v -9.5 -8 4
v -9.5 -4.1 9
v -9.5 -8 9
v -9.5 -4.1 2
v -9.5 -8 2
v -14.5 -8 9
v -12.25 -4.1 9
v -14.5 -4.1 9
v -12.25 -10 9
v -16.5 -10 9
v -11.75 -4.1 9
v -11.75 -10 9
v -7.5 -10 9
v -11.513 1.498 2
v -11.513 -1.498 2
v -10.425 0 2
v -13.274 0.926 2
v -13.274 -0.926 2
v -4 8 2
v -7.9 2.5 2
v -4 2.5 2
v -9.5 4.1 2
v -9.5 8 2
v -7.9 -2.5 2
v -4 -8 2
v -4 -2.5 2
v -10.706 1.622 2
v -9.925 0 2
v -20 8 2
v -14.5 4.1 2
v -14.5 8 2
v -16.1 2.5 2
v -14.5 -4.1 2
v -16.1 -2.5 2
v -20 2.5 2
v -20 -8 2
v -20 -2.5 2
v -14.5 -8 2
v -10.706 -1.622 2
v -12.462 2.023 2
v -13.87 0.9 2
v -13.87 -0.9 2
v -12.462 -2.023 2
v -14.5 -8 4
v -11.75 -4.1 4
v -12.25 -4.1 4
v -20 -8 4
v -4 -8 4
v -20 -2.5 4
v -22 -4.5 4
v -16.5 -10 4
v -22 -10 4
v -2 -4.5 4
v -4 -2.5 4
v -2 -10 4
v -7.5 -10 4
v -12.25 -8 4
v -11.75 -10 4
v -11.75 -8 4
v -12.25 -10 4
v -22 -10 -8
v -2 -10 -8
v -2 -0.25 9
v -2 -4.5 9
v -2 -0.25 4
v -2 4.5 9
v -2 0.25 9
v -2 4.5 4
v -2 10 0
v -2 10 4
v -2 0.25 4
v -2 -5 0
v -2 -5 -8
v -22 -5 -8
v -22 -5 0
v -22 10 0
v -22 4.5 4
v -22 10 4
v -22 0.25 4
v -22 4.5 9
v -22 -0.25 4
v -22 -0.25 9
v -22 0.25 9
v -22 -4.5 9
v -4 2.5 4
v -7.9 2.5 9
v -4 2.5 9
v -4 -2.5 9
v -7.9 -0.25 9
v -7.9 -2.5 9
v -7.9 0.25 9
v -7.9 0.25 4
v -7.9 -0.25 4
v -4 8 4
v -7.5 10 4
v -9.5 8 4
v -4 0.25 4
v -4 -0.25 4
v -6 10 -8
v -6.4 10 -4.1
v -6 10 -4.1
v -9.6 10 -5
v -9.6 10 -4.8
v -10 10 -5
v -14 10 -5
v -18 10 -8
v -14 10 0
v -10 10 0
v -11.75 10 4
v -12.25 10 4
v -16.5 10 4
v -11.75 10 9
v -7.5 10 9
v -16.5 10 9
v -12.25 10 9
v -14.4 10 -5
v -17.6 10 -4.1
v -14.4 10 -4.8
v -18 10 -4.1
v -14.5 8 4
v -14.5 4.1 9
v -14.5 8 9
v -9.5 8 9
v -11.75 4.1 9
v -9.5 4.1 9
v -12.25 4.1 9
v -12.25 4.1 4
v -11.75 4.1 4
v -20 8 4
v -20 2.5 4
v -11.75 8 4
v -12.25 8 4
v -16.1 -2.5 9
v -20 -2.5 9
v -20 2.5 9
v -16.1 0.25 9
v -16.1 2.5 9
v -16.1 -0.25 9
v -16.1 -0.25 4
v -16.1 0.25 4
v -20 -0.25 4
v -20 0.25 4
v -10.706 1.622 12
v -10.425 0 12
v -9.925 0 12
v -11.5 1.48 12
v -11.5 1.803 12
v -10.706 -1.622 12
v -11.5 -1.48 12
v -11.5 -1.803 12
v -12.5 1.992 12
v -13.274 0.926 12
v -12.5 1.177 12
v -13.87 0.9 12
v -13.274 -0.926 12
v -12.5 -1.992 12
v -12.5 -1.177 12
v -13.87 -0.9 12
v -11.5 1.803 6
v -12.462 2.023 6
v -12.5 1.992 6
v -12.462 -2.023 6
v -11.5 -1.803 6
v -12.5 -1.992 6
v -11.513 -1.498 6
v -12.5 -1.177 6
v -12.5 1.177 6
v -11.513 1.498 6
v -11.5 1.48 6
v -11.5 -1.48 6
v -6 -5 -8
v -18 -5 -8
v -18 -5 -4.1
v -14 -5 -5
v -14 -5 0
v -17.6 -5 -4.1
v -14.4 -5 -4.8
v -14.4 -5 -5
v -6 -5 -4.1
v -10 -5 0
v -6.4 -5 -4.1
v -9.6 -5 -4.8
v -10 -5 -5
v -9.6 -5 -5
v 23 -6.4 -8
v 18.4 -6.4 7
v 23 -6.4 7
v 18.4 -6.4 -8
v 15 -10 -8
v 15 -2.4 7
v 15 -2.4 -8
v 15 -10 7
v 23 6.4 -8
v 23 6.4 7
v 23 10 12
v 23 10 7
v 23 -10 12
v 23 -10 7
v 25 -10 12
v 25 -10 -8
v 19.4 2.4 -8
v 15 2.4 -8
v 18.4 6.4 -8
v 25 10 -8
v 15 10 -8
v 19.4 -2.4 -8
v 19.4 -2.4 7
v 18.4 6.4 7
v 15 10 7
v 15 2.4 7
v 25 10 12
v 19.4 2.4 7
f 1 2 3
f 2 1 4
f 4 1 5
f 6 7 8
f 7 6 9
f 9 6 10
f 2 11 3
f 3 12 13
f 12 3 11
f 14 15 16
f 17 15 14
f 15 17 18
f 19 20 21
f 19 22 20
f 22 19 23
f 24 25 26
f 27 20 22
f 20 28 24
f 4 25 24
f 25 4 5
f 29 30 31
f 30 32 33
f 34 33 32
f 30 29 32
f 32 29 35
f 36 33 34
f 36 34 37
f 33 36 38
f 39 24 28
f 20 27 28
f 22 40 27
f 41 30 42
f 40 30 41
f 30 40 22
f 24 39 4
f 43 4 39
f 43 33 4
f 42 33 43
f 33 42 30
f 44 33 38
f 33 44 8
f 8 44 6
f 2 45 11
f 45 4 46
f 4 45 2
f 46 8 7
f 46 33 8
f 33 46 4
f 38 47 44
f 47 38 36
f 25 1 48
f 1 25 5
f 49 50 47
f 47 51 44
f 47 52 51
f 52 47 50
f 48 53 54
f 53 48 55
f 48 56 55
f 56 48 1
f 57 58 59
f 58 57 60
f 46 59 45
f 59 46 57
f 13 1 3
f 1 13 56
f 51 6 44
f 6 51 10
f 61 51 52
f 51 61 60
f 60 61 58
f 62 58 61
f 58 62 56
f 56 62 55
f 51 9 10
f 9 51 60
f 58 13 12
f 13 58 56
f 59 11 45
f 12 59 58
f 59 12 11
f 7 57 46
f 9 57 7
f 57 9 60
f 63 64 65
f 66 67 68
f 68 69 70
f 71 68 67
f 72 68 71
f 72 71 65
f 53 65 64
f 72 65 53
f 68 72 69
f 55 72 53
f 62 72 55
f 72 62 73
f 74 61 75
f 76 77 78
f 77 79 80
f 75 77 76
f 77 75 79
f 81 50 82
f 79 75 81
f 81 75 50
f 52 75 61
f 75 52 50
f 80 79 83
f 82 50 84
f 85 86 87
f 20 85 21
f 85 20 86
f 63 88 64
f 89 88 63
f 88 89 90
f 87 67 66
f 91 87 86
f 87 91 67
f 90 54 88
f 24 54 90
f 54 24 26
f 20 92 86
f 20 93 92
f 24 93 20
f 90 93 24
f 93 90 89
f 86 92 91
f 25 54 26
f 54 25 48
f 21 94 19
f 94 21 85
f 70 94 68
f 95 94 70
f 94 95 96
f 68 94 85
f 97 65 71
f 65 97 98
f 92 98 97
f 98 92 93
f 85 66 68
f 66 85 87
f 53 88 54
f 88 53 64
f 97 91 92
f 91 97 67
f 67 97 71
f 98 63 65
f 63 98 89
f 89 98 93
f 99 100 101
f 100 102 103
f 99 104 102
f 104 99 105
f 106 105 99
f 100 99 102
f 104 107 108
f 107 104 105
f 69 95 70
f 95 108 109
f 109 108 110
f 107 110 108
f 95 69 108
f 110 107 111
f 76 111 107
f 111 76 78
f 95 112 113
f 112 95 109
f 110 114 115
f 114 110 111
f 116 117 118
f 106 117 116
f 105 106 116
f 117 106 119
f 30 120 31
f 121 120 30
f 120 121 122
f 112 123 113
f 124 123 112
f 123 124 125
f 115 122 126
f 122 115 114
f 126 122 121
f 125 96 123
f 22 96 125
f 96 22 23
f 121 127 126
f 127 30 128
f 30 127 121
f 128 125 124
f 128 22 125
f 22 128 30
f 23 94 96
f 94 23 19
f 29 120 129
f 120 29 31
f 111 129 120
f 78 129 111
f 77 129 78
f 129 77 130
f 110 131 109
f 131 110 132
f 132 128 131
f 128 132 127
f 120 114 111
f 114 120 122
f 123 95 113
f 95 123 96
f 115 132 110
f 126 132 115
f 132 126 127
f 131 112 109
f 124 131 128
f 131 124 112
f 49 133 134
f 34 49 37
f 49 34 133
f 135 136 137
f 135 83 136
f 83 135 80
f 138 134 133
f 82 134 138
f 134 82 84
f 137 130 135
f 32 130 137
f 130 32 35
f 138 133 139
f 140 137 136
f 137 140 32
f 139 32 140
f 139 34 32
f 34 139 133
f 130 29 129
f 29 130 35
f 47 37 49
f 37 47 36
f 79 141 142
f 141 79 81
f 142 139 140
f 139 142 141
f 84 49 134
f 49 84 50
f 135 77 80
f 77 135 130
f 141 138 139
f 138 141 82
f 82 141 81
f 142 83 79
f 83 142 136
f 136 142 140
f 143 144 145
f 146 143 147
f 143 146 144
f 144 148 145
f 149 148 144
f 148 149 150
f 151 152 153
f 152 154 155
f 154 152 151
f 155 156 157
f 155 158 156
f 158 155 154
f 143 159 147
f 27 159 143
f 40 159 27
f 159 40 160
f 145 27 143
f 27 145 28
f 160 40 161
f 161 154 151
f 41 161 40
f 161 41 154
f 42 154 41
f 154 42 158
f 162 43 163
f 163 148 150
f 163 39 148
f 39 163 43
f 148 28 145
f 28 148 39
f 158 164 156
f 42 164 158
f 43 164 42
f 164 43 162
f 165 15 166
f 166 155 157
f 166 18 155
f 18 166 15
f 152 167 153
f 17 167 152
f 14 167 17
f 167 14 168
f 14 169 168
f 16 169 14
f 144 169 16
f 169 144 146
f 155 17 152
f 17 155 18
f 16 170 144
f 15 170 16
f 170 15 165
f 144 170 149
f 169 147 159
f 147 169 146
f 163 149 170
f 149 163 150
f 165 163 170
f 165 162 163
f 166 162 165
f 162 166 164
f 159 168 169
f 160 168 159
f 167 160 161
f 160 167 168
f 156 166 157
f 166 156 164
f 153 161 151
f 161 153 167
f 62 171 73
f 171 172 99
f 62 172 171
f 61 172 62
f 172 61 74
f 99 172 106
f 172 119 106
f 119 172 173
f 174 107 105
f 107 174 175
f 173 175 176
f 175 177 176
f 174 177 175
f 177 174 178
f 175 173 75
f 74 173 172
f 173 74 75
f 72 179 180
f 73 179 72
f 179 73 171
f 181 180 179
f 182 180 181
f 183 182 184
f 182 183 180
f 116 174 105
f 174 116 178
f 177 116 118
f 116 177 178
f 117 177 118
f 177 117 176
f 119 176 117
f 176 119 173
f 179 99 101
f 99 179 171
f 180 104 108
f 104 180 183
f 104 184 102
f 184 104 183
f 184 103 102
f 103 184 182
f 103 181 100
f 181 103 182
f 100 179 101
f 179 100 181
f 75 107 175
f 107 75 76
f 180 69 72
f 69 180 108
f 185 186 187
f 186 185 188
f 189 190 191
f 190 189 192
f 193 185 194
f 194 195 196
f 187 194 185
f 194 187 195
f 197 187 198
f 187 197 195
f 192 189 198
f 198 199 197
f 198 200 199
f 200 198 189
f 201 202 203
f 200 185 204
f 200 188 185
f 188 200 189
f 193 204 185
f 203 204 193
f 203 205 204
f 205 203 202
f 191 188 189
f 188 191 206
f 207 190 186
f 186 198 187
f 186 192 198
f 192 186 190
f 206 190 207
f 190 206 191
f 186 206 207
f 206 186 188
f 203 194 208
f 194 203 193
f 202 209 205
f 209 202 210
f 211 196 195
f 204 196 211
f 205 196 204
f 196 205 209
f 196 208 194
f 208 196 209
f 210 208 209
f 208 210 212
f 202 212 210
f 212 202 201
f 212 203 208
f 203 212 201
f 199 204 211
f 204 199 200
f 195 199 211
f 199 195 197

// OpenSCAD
/*
----------------------------
-------Customization---------
----------------------------
*/

//Beam Outer Dimension
Size = 20; 
//Deeper plugs are more rigid
PlugDepth = 5;
//Center Post Diameter
CenterDiameter = 4.15;
//Center Post Depth
CenterDepth = 8;
//Width of interior slot edge
SlotWidth = 5;
//Depth of slot from outside edge
SlotDepth = 5.9;
//Thickness of slot lip
LipThickness = 2;
//Angle of slot lip
LipAngle = 45;

/*
----------------------------
-------Plug----------------
----------------------------
*/

module plug(width=20, depth=5, centerDepth=8, centerDiameter=4.15, lipThickness=2, lipAngle=45, slotWidth=5, slotDepth=5.9) {
    
    halfSlot = 0 - (slotWidth / 2);
    trueCenterDepth = centerDepth + 2;
    halfWidth = 0 - (width / 2);
    
    //Lip Polyhedron Derivation
    lipTransX = (lipThickness * tan(lipAngle));
    lipTransY = 0 - lipThickness;
    lipPolyPoints = [
        [0,0,0],                                    //0
        [slotWidth,0,0],                            //1
        [slotWidth + lipTransX,lipTransY,0],        //2
        [0 - lipTransX,lipTransY,0],                //3
        [0,0,depth],                            //4
        [slotWidth,0,depth],                    //5
        [slotWidth + lipTransX,lipTransY,depth],//6
        [0 - lipTransX,lipTransY,depth]         //7
    ];
    lipPolyFaces = [
        [0,3,2,1], //Bottom
        [0,1,5,4], //Front
        [0,4,7,3], //Right
        [6,5,1,2], //Left
        [6,2,3,7], //Back
        [6,7,4,5]  //Top
    ];
    
    //Plug Connector Polyhedron Derivation
    plugConnTrans = width / 5;
    plugConnHeight = width * 0.75;
    plugConnPolyPoints = [
        [0,0,0],                                    //0
        [0,3,0],                                    //1
        [0.4,3,0],                                  //2
        [0.4,3.2,0],                                //3
        [plugConnTrans - 0.4,3.9,0],                //4
        [plugConnTrans,3.9,0],                      //5
        [plugConnTrans,0,0],                        //6
        [0,0,plugConnHeight],                       //7
        [0,3,plugConnHeight],                       //8
        [0.4,3,plugConnHeight],                     //9
        [0.4,3.2,plugConnHeight],                   //10
        [plugConnTrans - 0.4,3.9,plugConnHeight],   //11
        [plugConnTrans,3.9,plugConnHeight],         //12
        [plugConnTrans,0,plugConnHeight],           //13
    ];
    plugConnPolyFaces = [
        [0,7,13,6],         //Front
        [6,13,12,5],        //Right
        [0,1,8,7],          //Left
        [0,6,5,4,3,2,1],    //Bottom
        [7,8,9,10,11,12,13],//Top
        [1,2,9,8],          //BackLeftA
        [2,3,10,9],         //BackLeftB
        [3,4,11,10],        //BackCenter
        [4,5,12,11],        //BackRight
    ];

    union() {
        cube([width,width,2], center=true); //Base Structure
        translate([0,0,1]) for(i = [0:3]) {    //Lip Generation
            angle = 90 * i;
            rotate(angle, [0,0,1]) {
                translate([halfWidth,halfWidth,0]) 
                    cube([width,lipThickness,2]);
                difference() {
                    translate([halfSlot,halfWidth + lipThickness,0])
                        union() {
                            cube([slotWidth,slotDepth - lipThickness,depth + 2]);
                            translate([0,0,2])
                                polyhedron(lipPolyPoints, lipPolyFaces);
                        }
                    translate([0 - ((slotWidth / 10) / 2), halfWidth - 1,2])
                        cube([slotWidth / 10,slotDepth + 2,depth + 1]);
                }
            }
        }
        translate([0,0,1]) { //Center Post
            difference() {
                difference() {
                    cylinder(h=trueCenterDepth,d=centerDiameter);
                    cylinder(h=trueCenterDepth + 1,d=centerDiameter - 1);
                }
            translate([-0.5,-1 - (centerDiameter / 2),4])
                cube([1,centerDiameter + 2,centerDepth]);
            }
        }
        translate([halfWidth,halfWidth,-9]) //Base of connector
            cube([width,width / 4, 8]);
        translate([0 - (width / 10),halfWidth,-9]) //Post of connector
            cube([width / 5,width,8]);
        translate([0,0 - halfWidth,-9]) //Flanges of connector
            rotate(90, [1,0,0]) {
                mirror([1,0,0])
                    translate([width / 10,0,0])
                        polyhedron(plugConnPolyPoints, plugConnPolyFaces);
                translate([width / 10,0,0])
                        polyhedron(plugConnPolyPoints, plugConnPolyFaces);
            }
    }
}
translate([-12,0,1]) plug(width=Size, depth=PlugDepth, centerDepth=CenterDepth, centerDiameter=CenterDiameter, lipThickness=LipThickness, slotWidth=SlotWidth, slotDepth=SlotDepth, lipAngle=LipAngle);

/*
----------------------------
-------ConnectorBase--------
----------------------------
*/
module connector(width=20) {
    
    halfWidth = 0 - (width / 2);
    //Connector Polyhedron Derivation
    connTrans = width / 5;
    connHeight = width * 0.75;
    connPolyPoints = [
        [0,0,0],                    //0
        [0,0,3.4],                  //1
        [connTrans,0,3.4],          //2
        [connTrans,0,-1],           //3
        [0,connHeight,0],           //4
        [0,connHeight,3.4],         //5
        [connTrans,connHeight,3.4], //6
        [connTrans,connHeight,-1]   //7
    ];

    connPolyFaces = [
        [0,3,2,1], //Bottom
        [4,5,6,7], //Top
        [6,5,1,2], //Front
        [7,6,2,3], //Left
        [5,4,0,1], //Right
        [4,7,3,0]  //Back
    ];
    
    union() {
        cube([width,width,2], center=true); //Base Structure
        mirror([1,0,0]) {
            translate([halfWidth,0 - (width / 4), 1]) {
                cube([(width / 5) - 0.4,width * 0.75,8]);
                translate([(width / 5) - 0.4,0,4.6])
                    polyhedron(connPolyPoints, connPolyFaces);
            }
        }
        translate([halfWidth,0 - (width / 4), 1]) {
                cube([(width / 5) - 0.4,width * 0.75,8]);
                translate([(width / 5) - 0.4,0,4.6])
                    polyhedron(connPolyPoints, connPolyFaces);
        }
    }
}
translate([Size + 4,0,2])
    rotate(90, [0,0,1])
        rotate(90, [-1,0,0])
            connector(width=Size);
